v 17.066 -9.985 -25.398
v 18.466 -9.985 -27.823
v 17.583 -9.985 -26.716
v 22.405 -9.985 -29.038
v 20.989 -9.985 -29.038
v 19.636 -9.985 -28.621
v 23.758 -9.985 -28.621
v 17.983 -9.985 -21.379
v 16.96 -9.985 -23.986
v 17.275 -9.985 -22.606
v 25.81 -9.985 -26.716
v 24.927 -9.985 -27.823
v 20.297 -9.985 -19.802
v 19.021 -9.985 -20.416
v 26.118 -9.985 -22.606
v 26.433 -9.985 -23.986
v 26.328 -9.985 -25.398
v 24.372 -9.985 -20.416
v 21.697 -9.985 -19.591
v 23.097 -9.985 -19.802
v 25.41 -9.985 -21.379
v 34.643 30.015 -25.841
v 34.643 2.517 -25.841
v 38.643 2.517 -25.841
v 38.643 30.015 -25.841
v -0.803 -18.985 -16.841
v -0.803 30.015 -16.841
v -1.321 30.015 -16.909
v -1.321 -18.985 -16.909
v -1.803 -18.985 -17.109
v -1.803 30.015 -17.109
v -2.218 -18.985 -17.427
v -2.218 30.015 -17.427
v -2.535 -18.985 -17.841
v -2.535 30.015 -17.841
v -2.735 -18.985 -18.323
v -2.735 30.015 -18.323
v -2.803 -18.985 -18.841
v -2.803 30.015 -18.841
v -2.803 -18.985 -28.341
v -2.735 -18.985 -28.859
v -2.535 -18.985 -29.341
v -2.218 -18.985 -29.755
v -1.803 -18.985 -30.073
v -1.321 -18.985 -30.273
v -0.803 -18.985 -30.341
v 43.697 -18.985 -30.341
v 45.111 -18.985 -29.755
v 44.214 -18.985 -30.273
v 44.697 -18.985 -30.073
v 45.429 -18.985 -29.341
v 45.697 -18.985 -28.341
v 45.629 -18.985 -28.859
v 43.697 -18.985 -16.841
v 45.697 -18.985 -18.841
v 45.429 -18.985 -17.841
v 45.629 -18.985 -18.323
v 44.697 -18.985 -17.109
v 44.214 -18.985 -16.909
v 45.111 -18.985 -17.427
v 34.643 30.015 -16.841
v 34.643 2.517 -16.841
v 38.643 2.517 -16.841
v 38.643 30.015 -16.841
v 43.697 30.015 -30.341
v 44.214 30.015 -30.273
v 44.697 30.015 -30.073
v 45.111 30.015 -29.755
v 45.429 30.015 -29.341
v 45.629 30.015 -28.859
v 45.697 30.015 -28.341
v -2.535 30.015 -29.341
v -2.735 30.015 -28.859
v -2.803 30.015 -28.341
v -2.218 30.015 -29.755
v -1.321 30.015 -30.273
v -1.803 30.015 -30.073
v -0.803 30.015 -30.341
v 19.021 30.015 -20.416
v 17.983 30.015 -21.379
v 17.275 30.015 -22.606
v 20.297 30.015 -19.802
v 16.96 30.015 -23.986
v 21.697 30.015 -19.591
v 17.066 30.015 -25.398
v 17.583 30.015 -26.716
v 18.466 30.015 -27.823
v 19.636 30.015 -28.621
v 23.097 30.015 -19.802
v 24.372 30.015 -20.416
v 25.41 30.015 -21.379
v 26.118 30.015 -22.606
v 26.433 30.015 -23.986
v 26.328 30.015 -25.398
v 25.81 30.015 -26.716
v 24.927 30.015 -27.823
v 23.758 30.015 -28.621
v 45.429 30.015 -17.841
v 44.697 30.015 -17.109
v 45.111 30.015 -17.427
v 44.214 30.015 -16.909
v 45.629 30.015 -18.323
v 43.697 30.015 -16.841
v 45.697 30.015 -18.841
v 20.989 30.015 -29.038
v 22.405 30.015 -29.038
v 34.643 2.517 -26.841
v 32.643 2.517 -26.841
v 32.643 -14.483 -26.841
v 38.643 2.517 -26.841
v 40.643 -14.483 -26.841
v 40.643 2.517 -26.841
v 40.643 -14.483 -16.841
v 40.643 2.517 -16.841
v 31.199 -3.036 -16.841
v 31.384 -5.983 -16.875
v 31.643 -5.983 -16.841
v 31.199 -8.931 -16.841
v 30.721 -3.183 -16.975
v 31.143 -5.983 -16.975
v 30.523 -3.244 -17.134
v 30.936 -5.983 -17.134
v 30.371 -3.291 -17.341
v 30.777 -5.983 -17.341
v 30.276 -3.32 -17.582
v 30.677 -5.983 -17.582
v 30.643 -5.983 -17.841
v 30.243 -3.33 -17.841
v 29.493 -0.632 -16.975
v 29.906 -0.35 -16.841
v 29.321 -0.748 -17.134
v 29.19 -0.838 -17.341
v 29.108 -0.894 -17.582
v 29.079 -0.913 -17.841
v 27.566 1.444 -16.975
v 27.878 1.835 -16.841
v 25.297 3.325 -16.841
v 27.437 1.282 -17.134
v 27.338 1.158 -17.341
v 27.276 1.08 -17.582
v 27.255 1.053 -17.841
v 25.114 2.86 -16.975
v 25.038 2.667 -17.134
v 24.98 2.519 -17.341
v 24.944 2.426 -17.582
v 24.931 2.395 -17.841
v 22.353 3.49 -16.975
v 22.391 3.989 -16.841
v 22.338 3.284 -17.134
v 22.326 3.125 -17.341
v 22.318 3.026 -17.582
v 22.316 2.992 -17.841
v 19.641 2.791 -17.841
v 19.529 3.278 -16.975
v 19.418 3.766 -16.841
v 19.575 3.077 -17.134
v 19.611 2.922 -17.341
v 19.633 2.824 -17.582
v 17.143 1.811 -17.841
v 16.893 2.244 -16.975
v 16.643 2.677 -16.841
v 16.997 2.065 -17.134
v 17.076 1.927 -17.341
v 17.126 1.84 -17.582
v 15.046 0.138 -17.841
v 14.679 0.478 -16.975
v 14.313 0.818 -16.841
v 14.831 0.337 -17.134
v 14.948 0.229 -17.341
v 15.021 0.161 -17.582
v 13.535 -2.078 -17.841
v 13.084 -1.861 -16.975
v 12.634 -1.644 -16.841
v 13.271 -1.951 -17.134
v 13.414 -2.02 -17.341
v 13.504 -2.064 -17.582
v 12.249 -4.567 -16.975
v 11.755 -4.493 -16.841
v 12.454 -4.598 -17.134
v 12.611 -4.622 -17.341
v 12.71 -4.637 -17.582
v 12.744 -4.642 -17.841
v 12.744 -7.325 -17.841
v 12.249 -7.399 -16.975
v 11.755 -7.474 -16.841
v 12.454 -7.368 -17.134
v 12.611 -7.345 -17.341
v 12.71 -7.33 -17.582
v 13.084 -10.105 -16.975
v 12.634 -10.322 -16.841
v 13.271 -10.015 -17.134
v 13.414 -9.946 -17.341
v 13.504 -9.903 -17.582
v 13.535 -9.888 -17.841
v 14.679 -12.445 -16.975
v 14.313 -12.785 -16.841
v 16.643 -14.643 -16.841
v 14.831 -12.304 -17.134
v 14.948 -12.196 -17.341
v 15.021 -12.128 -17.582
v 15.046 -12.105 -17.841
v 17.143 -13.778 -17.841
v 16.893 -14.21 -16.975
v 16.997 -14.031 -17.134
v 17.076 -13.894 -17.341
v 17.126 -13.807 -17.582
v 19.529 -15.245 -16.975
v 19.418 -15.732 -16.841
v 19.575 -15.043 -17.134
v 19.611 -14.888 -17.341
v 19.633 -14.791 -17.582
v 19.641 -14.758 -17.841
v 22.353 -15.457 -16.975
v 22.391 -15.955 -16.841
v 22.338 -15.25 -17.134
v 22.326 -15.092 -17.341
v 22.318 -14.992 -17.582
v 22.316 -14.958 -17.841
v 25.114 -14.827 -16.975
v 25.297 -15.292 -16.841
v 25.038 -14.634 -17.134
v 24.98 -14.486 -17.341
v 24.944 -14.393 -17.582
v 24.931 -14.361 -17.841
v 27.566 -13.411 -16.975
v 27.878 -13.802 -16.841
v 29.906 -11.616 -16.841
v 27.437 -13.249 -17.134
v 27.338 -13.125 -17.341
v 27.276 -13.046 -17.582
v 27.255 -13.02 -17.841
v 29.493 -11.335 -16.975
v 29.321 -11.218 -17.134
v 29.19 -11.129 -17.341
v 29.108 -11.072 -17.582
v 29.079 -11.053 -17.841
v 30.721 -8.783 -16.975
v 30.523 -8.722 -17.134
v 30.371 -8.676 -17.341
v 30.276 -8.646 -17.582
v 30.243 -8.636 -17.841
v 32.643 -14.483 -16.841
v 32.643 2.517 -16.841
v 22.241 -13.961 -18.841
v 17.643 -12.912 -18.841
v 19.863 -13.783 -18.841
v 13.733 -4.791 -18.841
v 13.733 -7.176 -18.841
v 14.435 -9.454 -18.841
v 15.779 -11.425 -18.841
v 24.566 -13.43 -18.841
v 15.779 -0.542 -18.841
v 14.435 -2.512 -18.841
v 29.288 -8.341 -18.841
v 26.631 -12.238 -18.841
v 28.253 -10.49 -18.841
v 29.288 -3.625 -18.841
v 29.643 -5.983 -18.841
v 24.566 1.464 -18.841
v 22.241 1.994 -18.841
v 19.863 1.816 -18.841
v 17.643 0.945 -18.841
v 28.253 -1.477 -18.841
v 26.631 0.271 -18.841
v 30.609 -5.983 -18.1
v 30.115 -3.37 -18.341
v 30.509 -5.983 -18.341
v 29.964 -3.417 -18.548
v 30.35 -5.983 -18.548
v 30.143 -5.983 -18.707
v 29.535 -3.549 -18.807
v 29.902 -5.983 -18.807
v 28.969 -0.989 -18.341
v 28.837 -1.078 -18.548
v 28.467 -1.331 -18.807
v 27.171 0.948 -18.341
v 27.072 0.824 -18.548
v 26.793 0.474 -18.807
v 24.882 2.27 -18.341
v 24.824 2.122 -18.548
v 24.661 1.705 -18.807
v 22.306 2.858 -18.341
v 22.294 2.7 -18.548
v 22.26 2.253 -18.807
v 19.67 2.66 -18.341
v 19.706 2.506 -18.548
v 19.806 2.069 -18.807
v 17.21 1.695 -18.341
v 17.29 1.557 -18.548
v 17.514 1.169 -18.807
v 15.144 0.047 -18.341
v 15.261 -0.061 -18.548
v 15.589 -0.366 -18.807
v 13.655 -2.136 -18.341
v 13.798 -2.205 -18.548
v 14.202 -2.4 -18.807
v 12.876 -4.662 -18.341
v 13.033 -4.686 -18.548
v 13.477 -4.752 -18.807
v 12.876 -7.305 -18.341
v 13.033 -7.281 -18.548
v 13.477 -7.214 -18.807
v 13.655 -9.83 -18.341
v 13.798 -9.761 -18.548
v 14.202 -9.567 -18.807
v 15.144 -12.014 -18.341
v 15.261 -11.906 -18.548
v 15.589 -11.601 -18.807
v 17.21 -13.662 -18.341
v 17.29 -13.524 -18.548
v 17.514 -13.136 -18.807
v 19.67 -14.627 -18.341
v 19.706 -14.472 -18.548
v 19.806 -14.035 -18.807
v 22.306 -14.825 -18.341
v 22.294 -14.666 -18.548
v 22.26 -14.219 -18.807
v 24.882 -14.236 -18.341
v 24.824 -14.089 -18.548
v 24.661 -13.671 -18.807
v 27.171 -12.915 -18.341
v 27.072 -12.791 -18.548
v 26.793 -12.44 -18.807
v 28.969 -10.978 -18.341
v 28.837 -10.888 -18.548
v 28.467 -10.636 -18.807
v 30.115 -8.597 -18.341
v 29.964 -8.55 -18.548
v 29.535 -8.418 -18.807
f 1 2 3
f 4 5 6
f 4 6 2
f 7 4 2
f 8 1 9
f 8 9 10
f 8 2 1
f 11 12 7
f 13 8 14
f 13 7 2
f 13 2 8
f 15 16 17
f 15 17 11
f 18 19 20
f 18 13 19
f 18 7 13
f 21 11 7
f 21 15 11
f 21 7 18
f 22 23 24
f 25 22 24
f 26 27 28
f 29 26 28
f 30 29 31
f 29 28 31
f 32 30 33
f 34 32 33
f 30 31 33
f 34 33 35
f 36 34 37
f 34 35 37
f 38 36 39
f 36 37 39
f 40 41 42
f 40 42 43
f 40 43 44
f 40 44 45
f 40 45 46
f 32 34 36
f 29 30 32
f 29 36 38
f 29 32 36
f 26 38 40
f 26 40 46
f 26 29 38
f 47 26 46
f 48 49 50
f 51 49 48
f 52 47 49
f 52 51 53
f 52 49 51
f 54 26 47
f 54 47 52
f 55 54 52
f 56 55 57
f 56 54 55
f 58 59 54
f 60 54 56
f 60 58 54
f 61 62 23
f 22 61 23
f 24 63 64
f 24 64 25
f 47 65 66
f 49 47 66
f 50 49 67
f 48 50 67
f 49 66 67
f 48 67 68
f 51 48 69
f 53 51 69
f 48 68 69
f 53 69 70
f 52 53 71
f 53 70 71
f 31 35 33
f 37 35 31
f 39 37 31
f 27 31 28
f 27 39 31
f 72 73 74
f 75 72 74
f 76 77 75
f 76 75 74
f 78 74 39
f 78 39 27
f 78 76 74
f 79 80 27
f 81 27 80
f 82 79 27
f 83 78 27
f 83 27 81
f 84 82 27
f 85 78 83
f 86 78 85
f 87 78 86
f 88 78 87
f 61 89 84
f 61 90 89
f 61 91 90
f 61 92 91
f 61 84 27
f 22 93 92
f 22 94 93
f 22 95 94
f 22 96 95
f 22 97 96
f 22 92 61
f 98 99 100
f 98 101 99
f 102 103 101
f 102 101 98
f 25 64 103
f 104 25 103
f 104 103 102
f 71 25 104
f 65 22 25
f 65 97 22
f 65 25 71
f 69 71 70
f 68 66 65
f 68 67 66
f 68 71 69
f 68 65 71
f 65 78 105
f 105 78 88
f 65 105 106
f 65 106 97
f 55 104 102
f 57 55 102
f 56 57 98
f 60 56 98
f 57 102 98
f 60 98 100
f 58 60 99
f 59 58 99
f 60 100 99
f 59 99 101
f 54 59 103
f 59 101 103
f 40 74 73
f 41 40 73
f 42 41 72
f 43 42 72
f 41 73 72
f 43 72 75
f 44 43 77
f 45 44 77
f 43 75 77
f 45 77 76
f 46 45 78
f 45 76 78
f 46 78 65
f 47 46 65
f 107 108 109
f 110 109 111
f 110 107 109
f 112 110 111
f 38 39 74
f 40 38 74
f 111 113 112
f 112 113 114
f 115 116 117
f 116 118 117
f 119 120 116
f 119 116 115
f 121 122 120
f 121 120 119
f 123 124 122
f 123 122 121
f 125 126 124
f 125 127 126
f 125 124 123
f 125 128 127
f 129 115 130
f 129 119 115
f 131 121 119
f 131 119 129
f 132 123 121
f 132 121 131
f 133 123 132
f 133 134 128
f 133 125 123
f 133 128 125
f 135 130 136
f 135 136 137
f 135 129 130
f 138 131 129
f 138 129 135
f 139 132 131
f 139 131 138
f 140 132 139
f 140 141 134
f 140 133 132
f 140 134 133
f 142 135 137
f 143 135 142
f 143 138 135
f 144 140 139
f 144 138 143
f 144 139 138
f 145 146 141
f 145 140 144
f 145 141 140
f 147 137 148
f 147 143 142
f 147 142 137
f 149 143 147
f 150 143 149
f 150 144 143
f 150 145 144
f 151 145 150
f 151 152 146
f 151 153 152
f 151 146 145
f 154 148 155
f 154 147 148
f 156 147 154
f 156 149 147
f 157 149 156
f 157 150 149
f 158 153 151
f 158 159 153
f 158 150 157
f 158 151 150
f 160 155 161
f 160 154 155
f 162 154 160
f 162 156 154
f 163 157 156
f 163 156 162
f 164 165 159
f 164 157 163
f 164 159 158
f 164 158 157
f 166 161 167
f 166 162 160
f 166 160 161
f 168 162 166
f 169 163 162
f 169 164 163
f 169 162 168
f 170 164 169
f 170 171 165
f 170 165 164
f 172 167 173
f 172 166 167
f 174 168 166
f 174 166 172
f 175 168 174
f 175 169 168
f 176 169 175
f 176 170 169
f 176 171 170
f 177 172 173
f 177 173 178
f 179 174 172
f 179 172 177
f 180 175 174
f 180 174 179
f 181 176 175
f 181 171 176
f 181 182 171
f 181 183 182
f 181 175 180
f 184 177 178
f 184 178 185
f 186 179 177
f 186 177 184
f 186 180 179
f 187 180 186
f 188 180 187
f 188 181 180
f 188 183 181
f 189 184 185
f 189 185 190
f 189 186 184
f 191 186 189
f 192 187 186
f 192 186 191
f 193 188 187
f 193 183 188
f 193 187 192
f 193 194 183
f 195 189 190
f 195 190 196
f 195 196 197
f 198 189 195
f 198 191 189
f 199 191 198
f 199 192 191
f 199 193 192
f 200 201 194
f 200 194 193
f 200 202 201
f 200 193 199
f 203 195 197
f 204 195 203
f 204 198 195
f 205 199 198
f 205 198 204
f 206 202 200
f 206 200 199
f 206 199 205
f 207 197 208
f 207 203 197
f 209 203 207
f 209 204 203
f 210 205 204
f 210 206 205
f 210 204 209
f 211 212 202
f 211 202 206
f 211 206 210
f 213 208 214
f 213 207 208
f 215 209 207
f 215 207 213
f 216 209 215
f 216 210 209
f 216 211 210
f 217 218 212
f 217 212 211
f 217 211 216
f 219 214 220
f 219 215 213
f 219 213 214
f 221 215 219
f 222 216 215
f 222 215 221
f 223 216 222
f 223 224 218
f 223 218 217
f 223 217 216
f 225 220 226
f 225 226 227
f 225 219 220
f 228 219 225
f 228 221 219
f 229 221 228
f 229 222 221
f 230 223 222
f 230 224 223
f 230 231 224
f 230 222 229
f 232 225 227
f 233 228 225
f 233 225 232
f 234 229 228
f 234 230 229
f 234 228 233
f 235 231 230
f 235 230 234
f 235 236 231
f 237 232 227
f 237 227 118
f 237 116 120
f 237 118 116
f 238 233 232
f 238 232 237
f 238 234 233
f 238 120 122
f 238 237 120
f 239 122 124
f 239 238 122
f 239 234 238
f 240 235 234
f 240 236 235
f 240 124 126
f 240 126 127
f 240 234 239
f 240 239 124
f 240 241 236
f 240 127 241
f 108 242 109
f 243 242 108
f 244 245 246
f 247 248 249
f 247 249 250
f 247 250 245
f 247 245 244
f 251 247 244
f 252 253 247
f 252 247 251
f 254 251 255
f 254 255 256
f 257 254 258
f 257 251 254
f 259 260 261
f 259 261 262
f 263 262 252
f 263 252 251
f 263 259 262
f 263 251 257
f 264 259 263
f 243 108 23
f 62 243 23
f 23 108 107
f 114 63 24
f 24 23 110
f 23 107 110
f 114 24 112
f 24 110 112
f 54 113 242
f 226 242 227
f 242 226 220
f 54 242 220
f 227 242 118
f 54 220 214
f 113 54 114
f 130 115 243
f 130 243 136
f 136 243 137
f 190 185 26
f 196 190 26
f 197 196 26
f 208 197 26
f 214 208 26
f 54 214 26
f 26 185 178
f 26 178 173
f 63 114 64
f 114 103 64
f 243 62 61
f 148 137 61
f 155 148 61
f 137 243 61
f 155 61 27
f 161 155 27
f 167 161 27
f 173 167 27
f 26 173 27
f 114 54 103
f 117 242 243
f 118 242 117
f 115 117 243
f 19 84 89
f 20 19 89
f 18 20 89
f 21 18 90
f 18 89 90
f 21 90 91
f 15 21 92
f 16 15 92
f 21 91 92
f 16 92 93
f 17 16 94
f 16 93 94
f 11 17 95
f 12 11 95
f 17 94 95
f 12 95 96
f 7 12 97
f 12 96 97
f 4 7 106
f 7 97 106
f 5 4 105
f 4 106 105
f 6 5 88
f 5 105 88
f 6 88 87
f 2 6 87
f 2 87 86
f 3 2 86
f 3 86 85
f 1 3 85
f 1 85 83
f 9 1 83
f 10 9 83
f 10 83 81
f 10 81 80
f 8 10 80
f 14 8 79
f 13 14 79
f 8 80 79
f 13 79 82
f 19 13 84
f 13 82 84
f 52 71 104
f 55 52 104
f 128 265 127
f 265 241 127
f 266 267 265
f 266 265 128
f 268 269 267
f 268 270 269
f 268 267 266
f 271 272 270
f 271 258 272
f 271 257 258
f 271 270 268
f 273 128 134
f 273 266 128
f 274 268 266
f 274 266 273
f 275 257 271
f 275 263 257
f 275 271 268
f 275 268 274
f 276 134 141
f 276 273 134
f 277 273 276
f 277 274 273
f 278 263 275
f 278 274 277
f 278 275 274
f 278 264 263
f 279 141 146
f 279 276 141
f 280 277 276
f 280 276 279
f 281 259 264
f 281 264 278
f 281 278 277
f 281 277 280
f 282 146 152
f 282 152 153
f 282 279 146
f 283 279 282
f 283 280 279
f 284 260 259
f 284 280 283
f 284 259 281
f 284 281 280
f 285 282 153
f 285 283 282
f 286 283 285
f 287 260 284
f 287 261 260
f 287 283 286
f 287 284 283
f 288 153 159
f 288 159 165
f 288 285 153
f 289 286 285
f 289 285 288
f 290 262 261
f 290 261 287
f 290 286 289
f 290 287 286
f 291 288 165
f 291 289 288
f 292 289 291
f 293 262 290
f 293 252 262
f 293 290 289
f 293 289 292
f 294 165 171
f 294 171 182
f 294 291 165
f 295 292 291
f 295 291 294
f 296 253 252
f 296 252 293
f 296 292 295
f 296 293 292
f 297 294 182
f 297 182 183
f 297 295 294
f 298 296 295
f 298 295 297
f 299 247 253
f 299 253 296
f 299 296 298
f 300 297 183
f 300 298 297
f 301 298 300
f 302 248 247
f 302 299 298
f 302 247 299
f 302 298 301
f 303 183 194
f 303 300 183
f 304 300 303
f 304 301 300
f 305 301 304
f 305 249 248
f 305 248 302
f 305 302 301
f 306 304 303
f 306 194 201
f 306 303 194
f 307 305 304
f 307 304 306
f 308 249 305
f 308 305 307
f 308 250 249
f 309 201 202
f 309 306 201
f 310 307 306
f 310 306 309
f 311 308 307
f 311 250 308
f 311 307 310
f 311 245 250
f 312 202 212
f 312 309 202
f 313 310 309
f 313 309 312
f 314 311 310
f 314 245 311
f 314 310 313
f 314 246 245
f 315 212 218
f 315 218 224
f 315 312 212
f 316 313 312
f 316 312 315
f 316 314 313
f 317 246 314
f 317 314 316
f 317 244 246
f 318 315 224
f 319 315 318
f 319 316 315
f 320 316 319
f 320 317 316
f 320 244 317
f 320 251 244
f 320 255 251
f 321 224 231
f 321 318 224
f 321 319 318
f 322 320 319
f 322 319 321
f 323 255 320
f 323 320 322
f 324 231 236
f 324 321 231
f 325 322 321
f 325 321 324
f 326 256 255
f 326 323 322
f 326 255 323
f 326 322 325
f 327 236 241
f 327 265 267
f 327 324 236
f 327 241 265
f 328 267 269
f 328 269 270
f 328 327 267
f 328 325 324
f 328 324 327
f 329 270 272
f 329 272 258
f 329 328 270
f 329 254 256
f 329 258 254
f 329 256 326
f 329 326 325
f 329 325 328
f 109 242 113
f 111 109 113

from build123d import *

# Parameters (mm, degrees)
EXTRUDE_1_DEPTH     = 49
SKETCH_2_W          = 8
SKETCH_2_H          = 17
CUT_EXTRUDE_1_DEPTH = 10
SKETCH_3_R          = 9
CUT_EXTRUDE_2_DEPTH = 2
FILLET_1_R          = 1
SKETCH_4_R          = 4.75
CUT_EXTRUDE_4_DEPTH = 40
SKETCH_5_W          = 4
SKETCH_5_H          = 10
CUT_EXTRUDE_5_DEPTH = 38
SKETCH_6_W          = 4
SKETCH_6_H          = 1
EXTRUDE_2_DEPTH     = 27.498032825


with BuildPart() as part:
    # 草图1 → 凸台-拉伸1 (new body)
    with BuildSketch(Plane.XZ.offset(-30.01474584)):
        with BuildLine():
            Line((43.696678655, -16.841019134), (-0.803321345, -16.841019134))
            ThreePointArc((-0.803321345, -16.841019134), (-2.217534907, -17.426805571), (-2.803321345, -18.841019134))
            Line((-2.803321345, -18.841019134), (-2.803321345, -28.341019134))
            ThreePointArc((-2.803321345, -28.341019134), (-2.217534907, -29.755232696), (-0.803321345, -30.341019134))
            Line((-0.803321345, -30.341019134), (43.696678655, -30.341019134))
            ThreePointArc((43.696678655, -30.341019134), (45.110892218, -29.755232696), (45.696678655, -28.341019134))
            Line((45.696678655, -28.341019134), (45.696678655, -18.841019134))
            ThreePointArc((45.696678655, -18.841019134), (45.110892218, -17.426805571), (43.696678655, -16.841019134))
        make_face()
    extrude(amount=EXTRUDE_1_DEPTH)

    # 草图2 → 切除-拉伸1 (cut)
    with BuildSketch(Plane.XY.offset(-16.841019134)):
        with Locations((36.643304361, -5.983286986)):
            Rectangle(SKETCH_2_W, SKETCH_2_H)
    extrude(amount=-CUT_EXTRUDE_1_DEPTH, mode=Mode.SUBTRACT)

    # 草图3 → 切除-拉伸2 (cut)
    with BuildSketch(Plane.XY.offset(-16.841019134)):
        with Locations((21.643304361, -5.983286986)):
            Circle(SKETCH_3_R)
    extrude(amount=-CUT_EXTRUDE_2_DEPTH, mode=Mode.SUBTRACT)

    # 圆角1
    fillet_1_edges = [part.edges().sort_by_distance(p)[0] for p in [
        (12.643304361, -5.983286986, -18.841019134),
        (12.643304361, -5.983286986, -16.841019134),
    ]]
    fillet(fillet_1_edges, radius=FILLET_1_R - 0.0001)  # a hair under: the kernel refuses the full size

    # 草图4 → 切除-拉伸4 (cut)
    with BuildSketch(Plane(origin=(0, 30.01474584, 0), x_dir=(1, 0, 0), z_dir=(0, 1, 0))):
        with Locations(Location((21.696678655, 24.341019134, 0), (0, 0, 270))):
            Circle(SKETCH_4_R)
    extrude(amount=-CUT_EXTRUDE_4_DEPTH, mode=Mode.SUBTRACT)

    # 草图5 → 切除-拉伸5 (cut)
    with BuildSketch(Plane(origin=(0, 30.01474584, 0), x_dir=(1, 0, 0), z_dir=(0, 1, 0))):
        with Locations((36.643304361, 21.841019134)):
            Rectangle(SKETCH_5_W, SKETCH_5_H)
    extrude(amount=-CUT_EXTRUDE_5_DEPTH, mode=Mode.SUBTRACT)

    # 草图6 → 凸台-拉伸2 (add)
    with BuildSketch(Plane(origin=(0, 30.01474584, 0), x_dir=(1, 0, 0), z_dir=(0, 1, 0))):
        with Locations((36.643304361, 26.341019134)):
            Rectangle(SKETCH_6_W, SKETCH_6_H)
    extrude(amount=-EXTRUDE_2_DEPTH)


solid = part.part
